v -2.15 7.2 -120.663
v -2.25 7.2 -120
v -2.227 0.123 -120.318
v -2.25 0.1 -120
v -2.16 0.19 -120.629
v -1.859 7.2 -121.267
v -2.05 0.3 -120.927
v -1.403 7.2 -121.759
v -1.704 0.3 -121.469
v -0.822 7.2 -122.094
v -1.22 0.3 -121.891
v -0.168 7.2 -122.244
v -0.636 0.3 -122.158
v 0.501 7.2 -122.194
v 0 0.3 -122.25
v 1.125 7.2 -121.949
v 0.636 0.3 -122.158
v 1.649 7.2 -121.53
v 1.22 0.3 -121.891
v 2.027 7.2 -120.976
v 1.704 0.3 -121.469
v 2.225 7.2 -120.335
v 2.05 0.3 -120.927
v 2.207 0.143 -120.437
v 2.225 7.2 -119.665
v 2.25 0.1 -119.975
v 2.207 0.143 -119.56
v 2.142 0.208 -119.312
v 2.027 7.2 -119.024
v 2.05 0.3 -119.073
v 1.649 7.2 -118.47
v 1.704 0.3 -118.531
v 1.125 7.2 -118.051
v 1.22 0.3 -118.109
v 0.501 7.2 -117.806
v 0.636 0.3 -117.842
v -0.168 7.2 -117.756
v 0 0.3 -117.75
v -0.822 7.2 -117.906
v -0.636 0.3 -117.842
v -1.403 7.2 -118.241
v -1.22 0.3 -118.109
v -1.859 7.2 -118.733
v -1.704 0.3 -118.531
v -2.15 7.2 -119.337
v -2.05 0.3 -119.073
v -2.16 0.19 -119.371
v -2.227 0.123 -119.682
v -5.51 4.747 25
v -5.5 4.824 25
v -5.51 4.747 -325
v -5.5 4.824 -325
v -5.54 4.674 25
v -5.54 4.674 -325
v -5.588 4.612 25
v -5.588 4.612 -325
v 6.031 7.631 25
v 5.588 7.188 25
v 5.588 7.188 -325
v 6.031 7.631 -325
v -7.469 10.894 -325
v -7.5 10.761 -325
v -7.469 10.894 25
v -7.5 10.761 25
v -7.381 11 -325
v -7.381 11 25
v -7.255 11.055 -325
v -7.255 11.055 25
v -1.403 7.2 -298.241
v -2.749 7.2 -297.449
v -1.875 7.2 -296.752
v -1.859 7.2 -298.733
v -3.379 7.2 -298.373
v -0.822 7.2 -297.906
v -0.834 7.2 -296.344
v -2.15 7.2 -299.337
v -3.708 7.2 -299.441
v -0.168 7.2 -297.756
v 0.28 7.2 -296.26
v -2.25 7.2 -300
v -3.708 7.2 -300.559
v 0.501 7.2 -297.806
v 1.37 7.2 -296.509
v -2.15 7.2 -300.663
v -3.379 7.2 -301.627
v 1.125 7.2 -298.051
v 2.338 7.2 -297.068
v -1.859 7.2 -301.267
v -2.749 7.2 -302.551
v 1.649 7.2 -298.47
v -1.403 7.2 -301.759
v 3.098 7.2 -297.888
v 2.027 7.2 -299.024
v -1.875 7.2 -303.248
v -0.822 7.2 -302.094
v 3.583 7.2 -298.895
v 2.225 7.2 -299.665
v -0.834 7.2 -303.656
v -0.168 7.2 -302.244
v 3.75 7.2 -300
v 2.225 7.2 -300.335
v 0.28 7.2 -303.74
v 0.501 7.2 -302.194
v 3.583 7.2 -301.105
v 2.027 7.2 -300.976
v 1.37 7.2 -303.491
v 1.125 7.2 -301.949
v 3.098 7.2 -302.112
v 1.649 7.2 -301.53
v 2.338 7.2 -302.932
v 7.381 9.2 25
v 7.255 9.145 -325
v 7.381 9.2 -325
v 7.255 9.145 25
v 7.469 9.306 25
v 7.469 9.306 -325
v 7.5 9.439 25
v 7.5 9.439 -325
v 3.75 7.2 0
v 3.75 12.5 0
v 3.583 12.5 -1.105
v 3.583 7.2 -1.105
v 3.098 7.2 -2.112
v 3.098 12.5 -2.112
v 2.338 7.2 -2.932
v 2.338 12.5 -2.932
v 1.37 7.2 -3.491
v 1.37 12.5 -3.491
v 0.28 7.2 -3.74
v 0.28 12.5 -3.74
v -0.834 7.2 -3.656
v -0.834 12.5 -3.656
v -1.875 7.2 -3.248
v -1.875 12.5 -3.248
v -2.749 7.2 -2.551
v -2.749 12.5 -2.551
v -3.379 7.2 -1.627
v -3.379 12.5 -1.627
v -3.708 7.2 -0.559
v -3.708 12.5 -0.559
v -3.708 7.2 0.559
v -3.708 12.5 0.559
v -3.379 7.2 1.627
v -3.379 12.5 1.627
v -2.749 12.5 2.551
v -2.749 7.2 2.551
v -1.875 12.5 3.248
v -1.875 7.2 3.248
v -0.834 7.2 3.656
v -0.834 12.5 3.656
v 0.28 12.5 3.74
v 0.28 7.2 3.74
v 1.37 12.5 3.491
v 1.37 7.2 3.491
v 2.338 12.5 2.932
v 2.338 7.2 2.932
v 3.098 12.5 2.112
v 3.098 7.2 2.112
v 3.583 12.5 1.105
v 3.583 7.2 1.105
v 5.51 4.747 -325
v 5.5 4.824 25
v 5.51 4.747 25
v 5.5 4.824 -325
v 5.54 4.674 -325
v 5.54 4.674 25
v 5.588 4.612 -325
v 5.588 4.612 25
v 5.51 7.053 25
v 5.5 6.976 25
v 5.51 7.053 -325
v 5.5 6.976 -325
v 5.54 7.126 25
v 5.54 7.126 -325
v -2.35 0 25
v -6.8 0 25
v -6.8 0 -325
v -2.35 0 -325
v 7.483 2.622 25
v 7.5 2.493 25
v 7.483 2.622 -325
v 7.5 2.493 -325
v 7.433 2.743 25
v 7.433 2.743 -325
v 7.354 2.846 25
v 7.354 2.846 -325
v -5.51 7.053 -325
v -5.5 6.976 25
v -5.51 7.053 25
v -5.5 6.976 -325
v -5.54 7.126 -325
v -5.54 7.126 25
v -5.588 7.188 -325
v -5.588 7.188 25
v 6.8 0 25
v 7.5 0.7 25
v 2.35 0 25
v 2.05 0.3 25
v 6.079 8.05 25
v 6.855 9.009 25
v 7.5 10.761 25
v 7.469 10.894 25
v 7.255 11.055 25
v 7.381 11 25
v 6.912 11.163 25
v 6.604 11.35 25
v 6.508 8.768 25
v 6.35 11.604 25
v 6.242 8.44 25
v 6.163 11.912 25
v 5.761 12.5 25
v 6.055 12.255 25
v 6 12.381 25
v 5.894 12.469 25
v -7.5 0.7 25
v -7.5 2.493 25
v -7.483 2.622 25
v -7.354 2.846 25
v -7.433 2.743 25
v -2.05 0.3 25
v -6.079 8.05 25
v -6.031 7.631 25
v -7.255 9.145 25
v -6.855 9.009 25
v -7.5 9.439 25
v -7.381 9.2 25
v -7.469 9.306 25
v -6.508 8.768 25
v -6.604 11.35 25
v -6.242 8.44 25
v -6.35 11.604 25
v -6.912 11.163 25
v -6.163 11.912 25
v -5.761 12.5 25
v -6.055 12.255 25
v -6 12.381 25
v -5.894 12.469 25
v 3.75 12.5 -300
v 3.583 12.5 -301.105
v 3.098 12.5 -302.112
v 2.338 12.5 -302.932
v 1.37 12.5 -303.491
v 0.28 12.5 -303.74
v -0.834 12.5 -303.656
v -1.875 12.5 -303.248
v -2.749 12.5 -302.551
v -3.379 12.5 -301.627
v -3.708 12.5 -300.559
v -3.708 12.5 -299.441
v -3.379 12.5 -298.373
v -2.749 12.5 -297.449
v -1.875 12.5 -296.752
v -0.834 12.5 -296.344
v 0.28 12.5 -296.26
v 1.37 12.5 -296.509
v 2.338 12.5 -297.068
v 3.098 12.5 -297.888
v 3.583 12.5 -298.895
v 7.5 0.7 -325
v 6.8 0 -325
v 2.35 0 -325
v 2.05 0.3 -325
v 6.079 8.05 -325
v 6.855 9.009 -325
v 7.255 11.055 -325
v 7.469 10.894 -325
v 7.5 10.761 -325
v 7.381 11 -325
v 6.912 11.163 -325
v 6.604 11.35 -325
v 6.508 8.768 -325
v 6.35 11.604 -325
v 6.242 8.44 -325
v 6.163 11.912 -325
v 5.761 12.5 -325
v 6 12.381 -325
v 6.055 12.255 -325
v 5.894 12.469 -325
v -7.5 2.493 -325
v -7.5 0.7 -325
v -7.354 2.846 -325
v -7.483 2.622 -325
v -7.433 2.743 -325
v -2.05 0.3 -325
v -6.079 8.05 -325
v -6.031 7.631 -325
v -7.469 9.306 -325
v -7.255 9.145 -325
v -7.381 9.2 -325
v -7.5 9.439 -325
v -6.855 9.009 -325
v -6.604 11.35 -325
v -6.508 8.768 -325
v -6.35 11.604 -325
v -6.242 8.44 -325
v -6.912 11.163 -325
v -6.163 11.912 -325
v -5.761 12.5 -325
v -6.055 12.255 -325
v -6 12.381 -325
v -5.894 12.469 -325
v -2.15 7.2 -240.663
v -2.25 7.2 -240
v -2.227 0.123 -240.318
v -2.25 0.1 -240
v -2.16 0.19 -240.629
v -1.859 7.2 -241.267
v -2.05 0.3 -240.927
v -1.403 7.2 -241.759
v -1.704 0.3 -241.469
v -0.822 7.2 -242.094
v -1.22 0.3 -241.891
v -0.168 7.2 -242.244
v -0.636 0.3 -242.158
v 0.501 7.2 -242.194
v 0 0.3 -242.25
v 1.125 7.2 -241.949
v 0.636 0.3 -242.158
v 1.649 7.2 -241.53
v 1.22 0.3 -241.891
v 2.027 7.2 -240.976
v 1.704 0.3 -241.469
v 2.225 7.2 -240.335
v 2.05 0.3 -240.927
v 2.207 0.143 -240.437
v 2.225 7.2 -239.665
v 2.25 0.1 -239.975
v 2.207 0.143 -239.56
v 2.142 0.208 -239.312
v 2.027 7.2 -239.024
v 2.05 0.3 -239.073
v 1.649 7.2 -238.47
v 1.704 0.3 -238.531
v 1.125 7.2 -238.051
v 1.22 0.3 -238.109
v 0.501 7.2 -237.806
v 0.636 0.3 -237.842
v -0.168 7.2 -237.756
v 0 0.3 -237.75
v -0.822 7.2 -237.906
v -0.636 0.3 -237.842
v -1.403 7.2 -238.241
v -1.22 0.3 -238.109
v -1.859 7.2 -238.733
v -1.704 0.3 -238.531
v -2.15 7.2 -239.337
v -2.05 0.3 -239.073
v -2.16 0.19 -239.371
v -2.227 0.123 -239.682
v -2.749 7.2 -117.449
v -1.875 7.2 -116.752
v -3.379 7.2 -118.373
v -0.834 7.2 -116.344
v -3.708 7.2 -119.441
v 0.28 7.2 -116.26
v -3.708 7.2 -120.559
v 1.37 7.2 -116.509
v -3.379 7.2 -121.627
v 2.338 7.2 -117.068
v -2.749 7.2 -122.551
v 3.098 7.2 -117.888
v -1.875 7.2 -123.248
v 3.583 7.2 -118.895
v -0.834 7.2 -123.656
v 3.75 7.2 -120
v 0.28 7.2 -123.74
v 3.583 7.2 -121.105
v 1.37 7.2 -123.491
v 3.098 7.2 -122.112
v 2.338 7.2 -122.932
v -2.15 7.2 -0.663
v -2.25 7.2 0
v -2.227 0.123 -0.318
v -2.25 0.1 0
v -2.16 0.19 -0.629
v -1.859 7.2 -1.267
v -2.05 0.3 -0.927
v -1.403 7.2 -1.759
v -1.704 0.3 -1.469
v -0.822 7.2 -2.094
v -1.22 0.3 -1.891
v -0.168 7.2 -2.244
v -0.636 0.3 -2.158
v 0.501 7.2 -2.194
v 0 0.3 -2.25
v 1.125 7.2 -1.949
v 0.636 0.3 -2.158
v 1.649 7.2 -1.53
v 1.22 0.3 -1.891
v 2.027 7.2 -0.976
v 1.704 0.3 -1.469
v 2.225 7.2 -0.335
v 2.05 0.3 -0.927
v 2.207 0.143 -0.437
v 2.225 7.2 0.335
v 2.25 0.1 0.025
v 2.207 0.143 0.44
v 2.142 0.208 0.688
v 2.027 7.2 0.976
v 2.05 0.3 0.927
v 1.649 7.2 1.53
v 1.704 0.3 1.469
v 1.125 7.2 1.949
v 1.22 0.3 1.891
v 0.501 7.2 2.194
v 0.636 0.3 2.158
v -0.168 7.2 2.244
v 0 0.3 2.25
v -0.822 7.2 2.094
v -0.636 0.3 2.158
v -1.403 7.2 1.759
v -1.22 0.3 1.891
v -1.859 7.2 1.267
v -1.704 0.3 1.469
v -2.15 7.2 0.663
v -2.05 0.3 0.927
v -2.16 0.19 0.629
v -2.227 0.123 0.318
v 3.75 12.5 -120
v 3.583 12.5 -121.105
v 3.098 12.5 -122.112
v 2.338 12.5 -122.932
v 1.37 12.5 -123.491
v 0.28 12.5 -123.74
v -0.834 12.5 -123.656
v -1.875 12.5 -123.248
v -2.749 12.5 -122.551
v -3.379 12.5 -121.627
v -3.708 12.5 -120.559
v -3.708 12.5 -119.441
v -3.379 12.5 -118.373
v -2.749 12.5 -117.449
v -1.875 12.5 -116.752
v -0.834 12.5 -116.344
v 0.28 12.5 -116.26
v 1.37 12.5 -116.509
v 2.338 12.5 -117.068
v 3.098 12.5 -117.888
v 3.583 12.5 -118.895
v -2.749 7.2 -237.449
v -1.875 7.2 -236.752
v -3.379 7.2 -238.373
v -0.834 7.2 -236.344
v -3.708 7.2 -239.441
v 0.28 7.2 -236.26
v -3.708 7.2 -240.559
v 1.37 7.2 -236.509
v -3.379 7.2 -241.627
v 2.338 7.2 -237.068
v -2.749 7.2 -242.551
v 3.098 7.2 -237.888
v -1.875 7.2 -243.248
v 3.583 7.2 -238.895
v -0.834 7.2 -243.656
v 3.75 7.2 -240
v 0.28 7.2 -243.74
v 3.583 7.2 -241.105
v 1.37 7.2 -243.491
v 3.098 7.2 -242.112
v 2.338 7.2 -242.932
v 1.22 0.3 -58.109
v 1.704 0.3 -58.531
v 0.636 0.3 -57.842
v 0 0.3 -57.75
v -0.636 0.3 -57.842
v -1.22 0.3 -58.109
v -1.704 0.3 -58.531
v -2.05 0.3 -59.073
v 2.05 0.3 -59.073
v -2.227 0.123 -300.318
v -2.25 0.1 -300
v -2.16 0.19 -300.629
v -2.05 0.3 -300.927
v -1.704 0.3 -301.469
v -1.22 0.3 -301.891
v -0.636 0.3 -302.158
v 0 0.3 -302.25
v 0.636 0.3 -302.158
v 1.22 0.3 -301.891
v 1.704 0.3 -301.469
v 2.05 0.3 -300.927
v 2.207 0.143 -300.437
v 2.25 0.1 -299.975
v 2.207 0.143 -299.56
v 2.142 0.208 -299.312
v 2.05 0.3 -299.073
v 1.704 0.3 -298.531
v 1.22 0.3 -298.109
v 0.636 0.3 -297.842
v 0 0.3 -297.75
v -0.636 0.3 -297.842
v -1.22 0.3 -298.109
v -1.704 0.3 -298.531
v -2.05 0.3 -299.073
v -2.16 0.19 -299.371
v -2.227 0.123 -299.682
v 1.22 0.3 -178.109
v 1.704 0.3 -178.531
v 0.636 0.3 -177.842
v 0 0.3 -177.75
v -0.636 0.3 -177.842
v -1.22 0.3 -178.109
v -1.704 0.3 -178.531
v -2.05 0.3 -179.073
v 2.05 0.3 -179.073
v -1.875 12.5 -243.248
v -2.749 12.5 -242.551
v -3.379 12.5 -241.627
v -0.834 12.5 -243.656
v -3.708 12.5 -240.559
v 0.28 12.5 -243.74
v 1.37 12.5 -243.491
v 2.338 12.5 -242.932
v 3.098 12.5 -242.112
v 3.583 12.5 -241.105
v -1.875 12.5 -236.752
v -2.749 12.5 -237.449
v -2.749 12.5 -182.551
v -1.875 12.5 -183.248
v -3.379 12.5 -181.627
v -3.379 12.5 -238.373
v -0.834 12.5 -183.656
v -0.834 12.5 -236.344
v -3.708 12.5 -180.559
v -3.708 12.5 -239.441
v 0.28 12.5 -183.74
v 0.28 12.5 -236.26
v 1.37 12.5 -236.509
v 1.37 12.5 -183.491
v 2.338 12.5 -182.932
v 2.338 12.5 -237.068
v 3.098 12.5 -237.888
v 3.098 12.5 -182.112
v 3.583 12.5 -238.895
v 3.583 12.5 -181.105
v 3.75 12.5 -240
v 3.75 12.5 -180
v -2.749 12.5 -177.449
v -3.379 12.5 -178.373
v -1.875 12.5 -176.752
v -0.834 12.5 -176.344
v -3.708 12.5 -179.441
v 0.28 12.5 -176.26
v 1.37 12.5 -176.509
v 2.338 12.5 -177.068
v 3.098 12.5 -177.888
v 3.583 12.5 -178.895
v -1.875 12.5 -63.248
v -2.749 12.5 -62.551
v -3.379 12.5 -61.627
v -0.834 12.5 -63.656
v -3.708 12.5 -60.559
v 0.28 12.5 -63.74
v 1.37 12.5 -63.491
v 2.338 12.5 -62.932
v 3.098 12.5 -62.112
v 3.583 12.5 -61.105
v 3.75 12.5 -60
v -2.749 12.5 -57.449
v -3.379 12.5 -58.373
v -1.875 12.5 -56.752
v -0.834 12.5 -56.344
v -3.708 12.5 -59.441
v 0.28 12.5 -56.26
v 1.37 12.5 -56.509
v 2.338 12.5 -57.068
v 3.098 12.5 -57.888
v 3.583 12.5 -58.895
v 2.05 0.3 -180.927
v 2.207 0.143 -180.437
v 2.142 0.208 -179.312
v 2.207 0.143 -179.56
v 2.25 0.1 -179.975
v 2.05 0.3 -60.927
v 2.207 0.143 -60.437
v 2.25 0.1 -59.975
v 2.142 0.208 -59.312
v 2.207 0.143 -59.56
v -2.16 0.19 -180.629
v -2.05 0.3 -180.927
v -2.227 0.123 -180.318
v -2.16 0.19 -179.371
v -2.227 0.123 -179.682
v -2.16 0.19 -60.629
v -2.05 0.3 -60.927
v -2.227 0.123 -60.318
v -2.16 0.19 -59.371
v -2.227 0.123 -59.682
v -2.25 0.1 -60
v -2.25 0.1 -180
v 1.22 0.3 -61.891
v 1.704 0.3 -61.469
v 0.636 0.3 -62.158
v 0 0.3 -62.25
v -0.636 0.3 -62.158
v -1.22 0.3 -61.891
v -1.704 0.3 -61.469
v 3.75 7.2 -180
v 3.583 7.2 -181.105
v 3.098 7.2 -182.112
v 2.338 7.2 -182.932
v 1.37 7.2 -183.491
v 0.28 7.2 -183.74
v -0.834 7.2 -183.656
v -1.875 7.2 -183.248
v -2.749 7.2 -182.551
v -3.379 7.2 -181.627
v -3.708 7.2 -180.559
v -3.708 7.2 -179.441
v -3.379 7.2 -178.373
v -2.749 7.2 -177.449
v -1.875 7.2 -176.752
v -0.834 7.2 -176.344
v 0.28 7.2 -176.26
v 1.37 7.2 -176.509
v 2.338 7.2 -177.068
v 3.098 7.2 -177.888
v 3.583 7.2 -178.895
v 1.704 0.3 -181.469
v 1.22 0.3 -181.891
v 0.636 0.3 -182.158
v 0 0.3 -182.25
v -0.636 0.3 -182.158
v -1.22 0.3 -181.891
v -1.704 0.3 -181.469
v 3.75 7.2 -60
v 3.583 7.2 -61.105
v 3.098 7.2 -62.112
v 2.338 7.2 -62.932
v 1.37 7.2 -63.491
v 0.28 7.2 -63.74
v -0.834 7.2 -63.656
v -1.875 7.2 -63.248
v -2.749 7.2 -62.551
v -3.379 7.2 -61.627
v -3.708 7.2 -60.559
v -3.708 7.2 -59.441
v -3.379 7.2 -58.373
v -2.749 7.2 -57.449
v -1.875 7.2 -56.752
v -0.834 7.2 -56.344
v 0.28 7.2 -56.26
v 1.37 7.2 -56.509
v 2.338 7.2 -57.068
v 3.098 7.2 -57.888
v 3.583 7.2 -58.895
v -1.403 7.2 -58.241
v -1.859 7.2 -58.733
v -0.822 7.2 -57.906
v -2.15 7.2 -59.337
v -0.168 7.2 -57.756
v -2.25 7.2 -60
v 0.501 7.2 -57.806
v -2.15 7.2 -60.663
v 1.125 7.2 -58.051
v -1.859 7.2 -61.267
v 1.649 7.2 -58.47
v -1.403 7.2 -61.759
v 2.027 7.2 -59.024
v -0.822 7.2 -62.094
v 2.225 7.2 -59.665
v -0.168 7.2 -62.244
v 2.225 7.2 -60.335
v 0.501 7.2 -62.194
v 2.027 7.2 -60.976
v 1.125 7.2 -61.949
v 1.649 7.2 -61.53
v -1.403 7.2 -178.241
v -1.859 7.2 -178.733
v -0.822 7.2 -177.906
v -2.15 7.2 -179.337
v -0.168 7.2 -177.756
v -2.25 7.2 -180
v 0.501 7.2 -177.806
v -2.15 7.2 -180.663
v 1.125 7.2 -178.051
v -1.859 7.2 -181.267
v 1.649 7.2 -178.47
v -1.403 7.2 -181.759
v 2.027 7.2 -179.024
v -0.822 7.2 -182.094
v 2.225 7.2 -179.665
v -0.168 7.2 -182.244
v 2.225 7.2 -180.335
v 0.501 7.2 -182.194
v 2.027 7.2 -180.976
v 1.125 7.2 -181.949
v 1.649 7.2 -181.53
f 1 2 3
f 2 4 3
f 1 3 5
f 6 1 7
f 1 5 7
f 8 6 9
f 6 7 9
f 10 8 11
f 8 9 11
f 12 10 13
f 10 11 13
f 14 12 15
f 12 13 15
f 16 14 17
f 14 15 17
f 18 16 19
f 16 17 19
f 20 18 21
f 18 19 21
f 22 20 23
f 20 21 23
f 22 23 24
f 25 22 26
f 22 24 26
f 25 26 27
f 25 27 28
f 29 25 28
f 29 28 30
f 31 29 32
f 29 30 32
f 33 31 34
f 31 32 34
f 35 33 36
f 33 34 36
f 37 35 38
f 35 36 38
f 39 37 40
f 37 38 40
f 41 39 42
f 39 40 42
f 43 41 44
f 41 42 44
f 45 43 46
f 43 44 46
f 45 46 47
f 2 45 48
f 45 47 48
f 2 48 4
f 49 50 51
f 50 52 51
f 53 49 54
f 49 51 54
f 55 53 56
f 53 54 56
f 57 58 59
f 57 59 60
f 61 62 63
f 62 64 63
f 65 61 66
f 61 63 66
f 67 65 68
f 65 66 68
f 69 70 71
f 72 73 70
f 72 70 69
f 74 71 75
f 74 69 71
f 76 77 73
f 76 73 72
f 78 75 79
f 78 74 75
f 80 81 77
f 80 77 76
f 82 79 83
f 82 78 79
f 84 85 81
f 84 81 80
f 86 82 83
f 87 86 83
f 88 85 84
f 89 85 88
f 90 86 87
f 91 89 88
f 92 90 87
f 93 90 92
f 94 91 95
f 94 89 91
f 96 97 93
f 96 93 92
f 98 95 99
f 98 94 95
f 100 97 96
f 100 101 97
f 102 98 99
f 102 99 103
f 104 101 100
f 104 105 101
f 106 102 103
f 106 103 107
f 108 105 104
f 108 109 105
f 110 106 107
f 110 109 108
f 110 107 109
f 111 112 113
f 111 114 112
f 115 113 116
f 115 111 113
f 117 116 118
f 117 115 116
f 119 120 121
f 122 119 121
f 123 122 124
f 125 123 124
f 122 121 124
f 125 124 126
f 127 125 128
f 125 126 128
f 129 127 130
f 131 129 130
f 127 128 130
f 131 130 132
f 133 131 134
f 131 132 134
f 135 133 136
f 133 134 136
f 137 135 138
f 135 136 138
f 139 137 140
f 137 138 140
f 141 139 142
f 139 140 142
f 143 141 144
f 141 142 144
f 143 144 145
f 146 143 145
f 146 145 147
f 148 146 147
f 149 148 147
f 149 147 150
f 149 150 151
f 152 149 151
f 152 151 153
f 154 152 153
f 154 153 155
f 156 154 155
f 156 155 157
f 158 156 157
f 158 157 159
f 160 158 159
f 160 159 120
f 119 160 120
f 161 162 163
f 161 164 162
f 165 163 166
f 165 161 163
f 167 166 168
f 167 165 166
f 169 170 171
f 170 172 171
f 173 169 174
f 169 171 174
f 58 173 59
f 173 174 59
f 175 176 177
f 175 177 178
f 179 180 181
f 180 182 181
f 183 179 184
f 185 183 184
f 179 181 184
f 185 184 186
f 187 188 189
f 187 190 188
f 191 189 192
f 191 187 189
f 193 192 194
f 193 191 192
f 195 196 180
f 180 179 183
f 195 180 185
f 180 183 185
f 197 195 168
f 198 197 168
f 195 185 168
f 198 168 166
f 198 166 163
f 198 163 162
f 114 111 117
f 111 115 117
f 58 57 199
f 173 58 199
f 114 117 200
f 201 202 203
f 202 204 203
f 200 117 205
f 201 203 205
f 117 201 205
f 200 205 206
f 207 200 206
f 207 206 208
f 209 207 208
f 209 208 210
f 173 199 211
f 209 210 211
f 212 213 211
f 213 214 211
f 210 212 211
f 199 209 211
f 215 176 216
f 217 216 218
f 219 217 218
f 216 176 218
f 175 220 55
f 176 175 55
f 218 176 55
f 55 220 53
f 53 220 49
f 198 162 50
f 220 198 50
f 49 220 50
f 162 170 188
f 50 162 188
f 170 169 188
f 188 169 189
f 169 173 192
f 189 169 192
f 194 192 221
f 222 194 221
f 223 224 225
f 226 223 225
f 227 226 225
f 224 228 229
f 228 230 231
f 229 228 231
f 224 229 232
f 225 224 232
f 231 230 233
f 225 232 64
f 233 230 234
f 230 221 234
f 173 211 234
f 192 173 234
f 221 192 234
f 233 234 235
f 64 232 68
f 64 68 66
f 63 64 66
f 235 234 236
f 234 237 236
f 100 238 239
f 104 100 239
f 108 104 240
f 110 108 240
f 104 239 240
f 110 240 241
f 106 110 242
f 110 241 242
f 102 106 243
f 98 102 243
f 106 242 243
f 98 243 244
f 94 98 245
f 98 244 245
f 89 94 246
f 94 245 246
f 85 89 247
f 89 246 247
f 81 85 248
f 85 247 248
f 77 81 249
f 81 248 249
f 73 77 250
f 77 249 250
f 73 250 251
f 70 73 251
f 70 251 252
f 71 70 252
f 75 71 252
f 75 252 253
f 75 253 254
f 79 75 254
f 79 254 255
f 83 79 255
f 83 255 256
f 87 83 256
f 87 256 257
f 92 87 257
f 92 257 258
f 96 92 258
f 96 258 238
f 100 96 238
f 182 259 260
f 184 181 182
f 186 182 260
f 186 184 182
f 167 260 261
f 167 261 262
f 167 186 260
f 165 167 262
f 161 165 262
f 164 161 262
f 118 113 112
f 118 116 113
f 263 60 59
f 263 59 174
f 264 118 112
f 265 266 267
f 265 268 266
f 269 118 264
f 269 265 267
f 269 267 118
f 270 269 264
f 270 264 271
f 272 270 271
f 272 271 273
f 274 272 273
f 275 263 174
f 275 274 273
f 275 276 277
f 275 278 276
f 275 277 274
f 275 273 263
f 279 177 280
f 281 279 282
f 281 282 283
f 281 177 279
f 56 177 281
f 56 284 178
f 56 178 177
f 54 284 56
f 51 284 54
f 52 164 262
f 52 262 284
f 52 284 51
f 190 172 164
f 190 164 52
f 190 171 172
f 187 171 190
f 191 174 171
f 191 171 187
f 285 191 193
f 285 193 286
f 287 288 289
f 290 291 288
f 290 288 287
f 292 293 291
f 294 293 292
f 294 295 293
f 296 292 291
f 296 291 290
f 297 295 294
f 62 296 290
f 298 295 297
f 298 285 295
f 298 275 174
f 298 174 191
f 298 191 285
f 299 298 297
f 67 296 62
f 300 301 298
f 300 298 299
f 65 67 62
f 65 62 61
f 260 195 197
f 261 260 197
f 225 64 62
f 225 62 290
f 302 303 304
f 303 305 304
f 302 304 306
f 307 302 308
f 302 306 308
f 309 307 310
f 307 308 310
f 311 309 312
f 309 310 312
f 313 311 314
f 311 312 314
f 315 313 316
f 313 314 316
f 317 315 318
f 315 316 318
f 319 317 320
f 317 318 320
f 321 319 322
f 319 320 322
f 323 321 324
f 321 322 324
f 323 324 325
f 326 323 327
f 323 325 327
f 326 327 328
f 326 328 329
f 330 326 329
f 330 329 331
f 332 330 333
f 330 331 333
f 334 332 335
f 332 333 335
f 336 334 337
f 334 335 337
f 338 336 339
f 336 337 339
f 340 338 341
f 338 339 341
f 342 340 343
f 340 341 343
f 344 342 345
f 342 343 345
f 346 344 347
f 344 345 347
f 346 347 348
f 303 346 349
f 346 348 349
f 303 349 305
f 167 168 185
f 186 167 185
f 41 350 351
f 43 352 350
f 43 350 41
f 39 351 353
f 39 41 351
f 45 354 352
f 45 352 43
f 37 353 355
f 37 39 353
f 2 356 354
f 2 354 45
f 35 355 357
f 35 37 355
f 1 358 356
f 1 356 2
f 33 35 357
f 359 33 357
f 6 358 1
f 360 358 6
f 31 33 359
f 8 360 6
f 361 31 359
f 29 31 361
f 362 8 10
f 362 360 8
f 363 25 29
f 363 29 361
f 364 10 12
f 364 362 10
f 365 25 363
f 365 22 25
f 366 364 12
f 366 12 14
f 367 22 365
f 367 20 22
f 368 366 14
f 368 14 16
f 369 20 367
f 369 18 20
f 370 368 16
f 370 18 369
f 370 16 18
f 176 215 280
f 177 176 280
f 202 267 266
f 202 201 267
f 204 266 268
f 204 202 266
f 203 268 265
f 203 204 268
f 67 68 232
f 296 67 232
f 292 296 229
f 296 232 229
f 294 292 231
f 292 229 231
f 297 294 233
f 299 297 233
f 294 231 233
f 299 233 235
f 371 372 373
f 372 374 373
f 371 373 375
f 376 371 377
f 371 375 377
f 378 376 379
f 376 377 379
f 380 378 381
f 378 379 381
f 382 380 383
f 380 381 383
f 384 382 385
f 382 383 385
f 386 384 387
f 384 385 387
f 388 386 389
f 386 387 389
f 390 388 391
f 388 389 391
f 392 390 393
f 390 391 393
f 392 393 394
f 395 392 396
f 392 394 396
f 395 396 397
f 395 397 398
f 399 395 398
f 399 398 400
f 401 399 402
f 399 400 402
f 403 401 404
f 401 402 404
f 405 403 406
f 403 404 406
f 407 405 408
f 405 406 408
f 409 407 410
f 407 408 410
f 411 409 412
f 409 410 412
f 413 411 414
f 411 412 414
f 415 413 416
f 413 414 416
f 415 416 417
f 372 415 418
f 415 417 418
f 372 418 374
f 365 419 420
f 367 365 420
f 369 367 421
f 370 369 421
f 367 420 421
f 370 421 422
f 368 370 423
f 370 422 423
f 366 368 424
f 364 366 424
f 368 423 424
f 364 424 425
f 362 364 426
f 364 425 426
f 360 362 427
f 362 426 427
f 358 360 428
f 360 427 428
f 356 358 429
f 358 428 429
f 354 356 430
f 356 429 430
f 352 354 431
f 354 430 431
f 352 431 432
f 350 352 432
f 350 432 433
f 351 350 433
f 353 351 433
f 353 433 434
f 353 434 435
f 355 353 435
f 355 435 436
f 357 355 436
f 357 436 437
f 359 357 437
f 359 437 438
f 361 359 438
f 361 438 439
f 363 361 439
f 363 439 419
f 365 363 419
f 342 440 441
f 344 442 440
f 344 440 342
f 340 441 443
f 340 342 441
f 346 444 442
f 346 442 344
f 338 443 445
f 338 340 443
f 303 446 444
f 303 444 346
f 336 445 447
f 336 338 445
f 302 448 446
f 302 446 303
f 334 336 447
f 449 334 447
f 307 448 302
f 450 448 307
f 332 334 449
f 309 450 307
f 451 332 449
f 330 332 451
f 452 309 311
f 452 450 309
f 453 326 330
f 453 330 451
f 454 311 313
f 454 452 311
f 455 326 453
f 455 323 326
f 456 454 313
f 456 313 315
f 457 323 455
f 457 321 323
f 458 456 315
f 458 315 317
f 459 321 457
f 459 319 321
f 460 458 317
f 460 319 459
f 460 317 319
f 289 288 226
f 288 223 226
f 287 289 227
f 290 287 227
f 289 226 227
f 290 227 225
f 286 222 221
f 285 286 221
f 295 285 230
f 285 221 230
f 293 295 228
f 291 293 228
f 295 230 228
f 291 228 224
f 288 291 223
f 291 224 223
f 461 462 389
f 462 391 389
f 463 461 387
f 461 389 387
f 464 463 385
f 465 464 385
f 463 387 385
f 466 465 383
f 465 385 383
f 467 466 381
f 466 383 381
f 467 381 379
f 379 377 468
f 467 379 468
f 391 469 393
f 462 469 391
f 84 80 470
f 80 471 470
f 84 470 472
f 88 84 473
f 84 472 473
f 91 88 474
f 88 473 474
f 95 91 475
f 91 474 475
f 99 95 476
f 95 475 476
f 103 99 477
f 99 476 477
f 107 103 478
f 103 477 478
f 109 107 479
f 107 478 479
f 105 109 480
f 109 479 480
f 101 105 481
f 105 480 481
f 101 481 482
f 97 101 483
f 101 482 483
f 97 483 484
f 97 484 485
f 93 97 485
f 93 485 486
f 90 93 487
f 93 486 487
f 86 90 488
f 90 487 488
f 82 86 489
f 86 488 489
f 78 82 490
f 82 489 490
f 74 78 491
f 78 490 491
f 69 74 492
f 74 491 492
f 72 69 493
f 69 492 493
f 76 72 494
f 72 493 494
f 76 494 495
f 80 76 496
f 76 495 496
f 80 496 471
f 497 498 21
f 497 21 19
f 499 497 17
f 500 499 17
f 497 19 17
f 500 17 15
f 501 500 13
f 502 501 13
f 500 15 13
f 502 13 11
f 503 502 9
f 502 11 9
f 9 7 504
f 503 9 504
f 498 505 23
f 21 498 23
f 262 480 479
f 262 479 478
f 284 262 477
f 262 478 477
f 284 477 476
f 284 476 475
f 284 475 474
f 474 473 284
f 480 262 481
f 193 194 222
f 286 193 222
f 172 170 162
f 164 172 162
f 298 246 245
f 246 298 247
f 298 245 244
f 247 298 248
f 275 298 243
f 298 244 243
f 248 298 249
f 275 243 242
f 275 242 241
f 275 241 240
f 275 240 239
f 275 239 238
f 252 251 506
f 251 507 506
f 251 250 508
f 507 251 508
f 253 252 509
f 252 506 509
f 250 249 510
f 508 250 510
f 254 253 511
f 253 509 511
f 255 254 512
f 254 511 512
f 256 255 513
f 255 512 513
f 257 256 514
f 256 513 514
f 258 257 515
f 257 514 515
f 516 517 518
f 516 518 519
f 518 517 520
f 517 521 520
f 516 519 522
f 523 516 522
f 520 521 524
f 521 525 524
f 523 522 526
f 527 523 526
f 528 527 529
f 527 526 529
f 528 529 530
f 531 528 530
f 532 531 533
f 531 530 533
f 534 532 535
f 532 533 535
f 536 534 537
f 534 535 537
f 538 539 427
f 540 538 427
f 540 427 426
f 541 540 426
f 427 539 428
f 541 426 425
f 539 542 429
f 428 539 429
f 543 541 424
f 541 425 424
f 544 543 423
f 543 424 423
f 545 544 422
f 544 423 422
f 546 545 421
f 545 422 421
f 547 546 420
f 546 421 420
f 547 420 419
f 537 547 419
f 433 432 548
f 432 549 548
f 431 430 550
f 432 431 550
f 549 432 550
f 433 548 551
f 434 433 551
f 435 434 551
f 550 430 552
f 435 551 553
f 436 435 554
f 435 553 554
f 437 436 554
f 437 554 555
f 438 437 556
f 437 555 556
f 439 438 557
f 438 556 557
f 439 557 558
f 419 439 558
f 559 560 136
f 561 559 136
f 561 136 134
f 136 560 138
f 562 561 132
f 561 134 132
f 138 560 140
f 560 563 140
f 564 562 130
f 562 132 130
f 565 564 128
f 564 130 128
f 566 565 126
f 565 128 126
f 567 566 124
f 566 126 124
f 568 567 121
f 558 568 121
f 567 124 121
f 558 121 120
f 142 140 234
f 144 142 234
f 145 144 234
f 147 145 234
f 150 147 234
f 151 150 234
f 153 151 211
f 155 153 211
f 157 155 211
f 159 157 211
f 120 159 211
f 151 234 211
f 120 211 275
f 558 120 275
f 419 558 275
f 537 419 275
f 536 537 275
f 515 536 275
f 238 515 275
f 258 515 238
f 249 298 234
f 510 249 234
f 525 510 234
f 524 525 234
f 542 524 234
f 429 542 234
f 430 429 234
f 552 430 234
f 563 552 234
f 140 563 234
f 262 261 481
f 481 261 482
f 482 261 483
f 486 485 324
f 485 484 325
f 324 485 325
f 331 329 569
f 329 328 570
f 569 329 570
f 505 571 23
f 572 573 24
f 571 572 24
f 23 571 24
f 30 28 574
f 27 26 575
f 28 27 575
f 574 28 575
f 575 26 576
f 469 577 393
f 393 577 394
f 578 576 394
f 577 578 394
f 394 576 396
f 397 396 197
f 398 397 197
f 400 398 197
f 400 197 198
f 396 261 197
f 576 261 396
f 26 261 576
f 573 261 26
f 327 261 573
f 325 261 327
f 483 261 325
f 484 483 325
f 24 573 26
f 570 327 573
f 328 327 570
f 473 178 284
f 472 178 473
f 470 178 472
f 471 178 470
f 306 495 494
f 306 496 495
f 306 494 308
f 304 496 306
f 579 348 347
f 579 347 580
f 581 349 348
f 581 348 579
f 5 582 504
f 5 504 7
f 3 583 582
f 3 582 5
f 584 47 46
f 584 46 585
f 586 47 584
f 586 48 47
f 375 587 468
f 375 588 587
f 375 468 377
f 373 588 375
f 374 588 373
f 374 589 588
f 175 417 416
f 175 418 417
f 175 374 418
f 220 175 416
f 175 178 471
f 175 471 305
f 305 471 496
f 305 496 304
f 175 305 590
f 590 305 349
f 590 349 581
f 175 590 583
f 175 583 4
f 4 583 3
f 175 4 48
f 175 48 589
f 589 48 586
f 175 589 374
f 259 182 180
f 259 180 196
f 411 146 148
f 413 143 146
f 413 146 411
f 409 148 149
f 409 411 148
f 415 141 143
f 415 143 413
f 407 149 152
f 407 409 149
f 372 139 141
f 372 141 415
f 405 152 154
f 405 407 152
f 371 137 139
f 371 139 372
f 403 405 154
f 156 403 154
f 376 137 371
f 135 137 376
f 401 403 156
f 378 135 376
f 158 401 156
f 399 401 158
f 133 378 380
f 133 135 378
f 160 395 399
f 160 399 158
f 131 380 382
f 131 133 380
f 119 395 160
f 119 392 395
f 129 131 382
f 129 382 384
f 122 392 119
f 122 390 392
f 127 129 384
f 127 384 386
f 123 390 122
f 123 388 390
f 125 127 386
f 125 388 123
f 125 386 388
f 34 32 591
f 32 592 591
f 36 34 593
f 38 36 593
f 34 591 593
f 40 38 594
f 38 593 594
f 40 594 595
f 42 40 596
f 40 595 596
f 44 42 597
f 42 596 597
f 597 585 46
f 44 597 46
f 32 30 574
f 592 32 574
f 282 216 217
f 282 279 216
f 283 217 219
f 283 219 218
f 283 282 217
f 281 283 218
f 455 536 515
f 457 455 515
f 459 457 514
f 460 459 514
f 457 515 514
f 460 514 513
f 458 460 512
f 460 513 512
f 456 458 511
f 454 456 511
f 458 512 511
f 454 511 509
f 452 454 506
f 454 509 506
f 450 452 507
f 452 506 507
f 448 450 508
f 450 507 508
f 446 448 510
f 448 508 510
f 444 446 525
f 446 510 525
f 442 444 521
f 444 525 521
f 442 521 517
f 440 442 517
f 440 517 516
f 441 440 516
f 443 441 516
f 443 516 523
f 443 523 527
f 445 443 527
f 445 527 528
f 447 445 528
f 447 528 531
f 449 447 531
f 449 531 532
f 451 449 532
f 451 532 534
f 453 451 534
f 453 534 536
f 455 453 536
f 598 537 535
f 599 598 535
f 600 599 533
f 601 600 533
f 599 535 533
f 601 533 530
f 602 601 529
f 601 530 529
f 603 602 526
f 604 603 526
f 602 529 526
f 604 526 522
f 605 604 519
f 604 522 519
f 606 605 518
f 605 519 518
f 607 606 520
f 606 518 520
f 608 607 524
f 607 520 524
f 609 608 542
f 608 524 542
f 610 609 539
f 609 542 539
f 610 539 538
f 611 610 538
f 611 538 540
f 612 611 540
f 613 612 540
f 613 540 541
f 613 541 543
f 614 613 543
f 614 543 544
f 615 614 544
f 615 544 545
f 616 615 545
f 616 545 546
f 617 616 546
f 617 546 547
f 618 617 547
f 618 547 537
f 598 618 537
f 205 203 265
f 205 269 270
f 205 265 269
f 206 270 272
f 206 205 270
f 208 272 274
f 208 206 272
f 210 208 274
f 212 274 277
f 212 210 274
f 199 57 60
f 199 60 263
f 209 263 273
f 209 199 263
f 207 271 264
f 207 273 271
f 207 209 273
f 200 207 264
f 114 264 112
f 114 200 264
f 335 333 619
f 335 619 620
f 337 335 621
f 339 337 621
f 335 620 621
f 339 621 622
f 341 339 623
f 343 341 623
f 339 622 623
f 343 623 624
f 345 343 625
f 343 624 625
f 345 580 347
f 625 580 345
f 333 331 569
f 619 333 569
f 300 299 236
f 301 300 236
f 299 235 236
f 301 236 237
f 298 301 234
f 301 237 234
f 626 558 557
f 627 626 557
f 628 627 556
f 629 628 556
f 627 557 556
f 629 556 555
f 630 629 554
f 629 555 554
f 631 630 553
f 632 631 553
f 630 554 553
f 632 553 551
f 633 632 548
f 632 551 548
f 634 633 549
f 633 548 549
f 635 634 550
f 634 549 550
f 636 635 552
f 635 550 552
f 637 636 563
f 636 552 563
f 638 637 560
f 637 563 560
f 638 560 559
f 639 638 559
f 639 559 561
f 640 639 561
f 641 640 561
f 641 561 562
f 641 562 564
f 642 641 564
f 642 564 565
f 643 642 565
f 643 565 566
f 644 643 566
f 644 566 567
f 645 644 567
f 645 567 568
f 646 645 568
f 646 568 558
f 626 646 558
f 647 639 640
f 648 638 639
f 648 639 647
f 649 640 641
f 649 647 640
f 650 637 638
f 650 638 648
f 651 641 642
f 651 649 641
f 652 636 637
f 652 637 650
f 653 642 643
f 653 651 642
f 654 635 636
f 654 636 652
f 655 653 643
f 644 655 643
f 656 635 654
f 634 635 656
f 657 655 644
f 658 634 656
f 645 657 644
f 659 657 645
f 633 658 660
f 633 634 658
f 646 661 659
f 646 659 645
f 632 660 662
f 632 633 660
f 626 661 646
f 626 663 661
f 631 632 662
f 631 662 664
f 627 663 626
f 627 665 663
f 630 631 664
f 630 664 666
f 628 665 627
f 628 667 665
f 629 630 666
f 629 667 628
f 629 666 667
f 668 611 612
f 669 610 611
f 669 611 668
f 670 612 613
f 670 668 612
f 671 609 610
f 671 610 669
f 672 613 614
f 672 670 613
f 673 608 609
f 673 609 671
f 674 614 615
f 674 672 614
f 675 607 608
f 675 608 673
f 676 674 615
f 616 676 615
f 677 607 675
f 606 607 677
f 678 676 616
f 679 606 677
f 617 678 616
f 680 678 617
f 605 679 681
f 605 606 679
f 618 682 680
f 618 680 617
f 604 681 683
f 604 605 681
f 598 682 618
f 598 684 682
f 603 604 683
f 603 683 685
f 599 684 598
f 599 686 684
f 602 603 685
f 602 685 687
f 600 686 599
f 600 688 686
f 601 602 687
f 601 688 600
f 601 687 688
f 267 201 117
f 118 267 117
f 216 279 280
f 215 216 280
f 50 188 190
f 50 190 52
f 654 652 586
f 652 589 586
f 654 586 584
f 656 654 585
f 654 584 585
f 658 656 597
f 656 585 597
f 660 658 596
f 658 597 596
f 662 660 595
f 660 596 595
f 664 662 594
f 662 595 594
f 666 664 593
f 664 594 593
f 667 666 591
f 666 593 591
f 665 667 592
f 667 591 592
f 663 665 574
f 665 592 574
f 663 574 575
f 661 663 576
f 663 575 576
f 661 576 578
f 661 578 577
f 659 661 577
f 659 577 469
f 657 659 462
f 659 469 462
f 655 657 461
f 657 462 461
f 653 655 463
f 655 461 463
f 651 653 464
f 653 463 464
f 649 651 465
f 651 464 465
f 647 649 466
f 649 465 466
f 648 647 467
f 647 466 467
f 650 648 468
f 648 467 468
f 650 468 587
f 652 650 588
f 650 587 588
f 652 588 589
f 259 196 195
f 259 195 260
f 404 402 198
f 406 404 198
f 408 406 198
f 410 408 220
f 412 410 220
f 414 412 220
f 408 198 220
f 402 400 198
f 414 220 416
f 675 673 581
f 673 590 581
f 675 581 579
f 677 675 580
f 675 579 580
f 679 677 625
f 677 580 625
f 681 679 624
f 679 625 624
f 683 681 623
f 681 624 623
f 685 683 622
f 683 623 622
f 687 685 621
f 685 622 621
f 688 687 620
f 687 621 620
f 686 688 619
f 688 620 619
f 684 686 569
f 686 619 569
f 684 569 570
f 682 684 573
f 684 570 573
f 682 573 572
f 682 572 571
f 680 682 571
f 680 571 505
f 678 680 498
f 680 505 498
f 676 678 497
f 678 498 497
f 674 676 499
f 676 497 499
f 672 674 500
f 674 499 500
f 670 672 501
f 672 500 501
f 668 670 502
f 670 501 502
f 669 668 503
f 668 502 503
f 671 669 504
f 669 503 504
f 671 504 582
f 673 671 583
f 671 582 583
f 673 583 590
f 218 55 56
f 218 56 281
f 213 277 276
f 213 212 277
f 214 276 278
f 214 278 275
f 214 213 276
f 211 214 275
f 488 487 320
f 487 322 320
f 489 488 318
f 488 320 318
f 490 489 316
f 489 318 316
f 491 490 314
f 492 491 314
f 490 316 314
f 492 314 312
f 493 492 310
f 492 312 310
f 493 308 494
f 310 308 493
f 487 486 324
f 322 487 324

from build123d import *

# Parameters (mm, degrees)
BOSS_EXTRUDE101_DEPTH        = 350
SKETCH2_R                    = 1.5
CUT_EXTRUDE101_DEPTH         = 351.303439892
CHAMFER101_SIZE              = 0.7
FILLET101_R                  = 0.5
FILLET102_R                  = 0.3
FILLET103_R                  = 0.3
FILLET104_R                  = 0.3
CHAMFER101_OF_MIRROR101_SIZE = 0.7
FILLET101_OF_MIRROR101_R     = 0.5
FILLET102_OF_MIRROR101_R     = 0.3
FILLET103_OF_MIRROR101_R     = 0.3
FILLET104_OF_MIRROR101_R     = 0.3
CBORE101_D                   = 4.5
CBORE101_CBORE_D             = 7.5
CBORE101_CBORE_DEPTH         = 5.3
LPATTERN101_COUNT            = 6
LPATTERN101_PITCH            = 60


with BuildPart() as part:
    # Sketch1 → Boss-Extrude101 (new body)
    with BuildSketch(Plane.XY.offset(25)):
        Polygon((-2.05, 0.3), (0, 0.3), (0, 12.5), (-7.5, 12.5), (-7.5, 7.1), (-5.5, 7.1), (-5.5, 4.7), (-7.5, 2.7), (-7.5, 0), (-2.35, 0), align=None)
    boss_extrude101 = extrude(amount=-BOSS_EXTRUDE101_DEPTH)

    # Sketch2 → Cut-Extrude101 (cut, through all)
    with BuildSketch(Plane.XY.offset(25)):
        with Locations((-7.53, 12.53)):
            Circle(SKETCH2_R)
        with BuildLine():
            Line((-5.5, 7.1), (-6.030519656, 7.630519656))
            ThreePointArc((-6.030519656, 7.630519656), (-8.576608686, 8.744527923), (-7.53, 6.17))
            Line((-7.53, 6.17), (-7.5, 2.7))
            Line((-7.5, 2.7), (-5.5, 4.7))
            Line((-5.5, 4.7), (-5.5, 7.1))
        make_face()
    cut_extrude101 = extrude(amount=-CUT_EXTRUDE101_DEPTH, mode=Mode.SUBTRACT)

    # Chamfer101
    chamfer101_edges = [part.edges().sort_by_distance(p)[0] for p in [
        (-7.5, 0, -150),
    ]]
    chamfer(chamfer101_edges, length=CHAMFER101_SIZE)

    # Fillet101
    fillet101_edges = [part.edges().sort_by_distance(p)[0] for p in [
        (-7.5, 2.7, -150),
    ]]
    fillet(fillet101_edges, radius=FILLET101_R)

    # Fillet102
    fillet102_edges = [part.edges().sort_by_distance(p)[0] for p in [
        (-5.5, 7.1, -150),
    ]]
    fillet(fillet102_edges, radius=FILLET102_R)

    # Fillet103
    fillet103_edges = [part.edges().sort_by_distance(p)[0] for p in [
        (-7.5, 11.03030003, -150),
        (-6.03030003, 12.5, -150),
        (-7.5, 9.16969997, -150),
    ]]
    fillet(fillet103_edges, radius=FILLET103_R)

    # Fillet104
    fillet104_edges = [part.edges().sort_by_distance(p)[0] for p in [
        (-5.5, 4.7, -150),
    ]]
    fillet(fillet104_edges, radius=FILLET104_R)

    # Mirror101: Boss-Extrude101, Cut-Extrude101 across plane
    add(boss_extrude101.mirror(Plane(origin=(0, 0, 0), x_dir=(0, 0, 1), z_dir=(1, 0, 0))))
    add(cut_extrude101.mirror(Plane(origin=(0, 0, 0), x_dir=(0, 0, 1), z_dir=(1, 0, 0))), mode=Mode.SUBTRACT)

    # Chamfer101 of Mirror101
    chamfer101_of_mirror101_edges = [part.edges().sort_by_distance(p)[0] for p in [
        (7.5, 0, -150),
    ]]
    chamfer(chamfer101_of_mirror101_edges, length=CHAMFER101_OF_MIRROR101_SIZE)

    # Fillet101 of Mirror101
    fillet101_of_mirror101_edges = [part.edges().sort_by_distance(p)[0] for p in [
        (7.5, 2.7, -150),
    ]]
    fillet(fillet101_of_mirror101_edges, radius=FILLET101_OF_MIRROR101_R)

    # Fillet102 of Mirror101
    fillet102_of_mirror101_edges = [part.edges().sort_by_distance(p)[0] for p in [
        (5.5, 7.1, -150),
    ]]
    fillet(fillet102_of_mirror101_edges, radius=FILLET102_OF_MIRROR101_R)

    # Fillet103 of Mirror101
    fillet103_of_mirror101_edges = [part.edges().sort_by_distance(p)[0] for p in [
        (7.5, 11.03030003, -150),
        (6.03030003, 12.5, -150),
        (7.5, 9.16969997, -150),
    ]]
    fillet(fillet103_of_mirror101_edges, radius=FILLET103_OF_MIRROR101_R)

    # Fillet104 of Mirror101
    fillet104_of_mirror101_edges = [part.edges().sort_by_distance(p)[0] for p in [
        (5.5, 4.7, -150),
    ]]
    fillet(fillet104_of_mirror101_edges, radius=FILLET104_OF_MIRROR101_R)

    # CBORE101 (through all)
    with Locations(Plane(origin=(0, 12.5, 0), x_dir=(1, 0, 0), z_dir=(0, 1, 0))):
        with Locations((0, 0)):
            cbore101 = CounterBoreHole(CBORE101_D / 2, CBORE101_CBORE_D / 2, CBORE101_CBORE_DEPTH)

    # LPattern101: CBORE101 ×6
    with Locations(*[(0, 0, -i * LPATTERN101_PITCH) for i in range(1, LPATTERN101_COUNT)]):
        add(cbore101, mode=Mode.SUBTRACT)


solid = part.part
